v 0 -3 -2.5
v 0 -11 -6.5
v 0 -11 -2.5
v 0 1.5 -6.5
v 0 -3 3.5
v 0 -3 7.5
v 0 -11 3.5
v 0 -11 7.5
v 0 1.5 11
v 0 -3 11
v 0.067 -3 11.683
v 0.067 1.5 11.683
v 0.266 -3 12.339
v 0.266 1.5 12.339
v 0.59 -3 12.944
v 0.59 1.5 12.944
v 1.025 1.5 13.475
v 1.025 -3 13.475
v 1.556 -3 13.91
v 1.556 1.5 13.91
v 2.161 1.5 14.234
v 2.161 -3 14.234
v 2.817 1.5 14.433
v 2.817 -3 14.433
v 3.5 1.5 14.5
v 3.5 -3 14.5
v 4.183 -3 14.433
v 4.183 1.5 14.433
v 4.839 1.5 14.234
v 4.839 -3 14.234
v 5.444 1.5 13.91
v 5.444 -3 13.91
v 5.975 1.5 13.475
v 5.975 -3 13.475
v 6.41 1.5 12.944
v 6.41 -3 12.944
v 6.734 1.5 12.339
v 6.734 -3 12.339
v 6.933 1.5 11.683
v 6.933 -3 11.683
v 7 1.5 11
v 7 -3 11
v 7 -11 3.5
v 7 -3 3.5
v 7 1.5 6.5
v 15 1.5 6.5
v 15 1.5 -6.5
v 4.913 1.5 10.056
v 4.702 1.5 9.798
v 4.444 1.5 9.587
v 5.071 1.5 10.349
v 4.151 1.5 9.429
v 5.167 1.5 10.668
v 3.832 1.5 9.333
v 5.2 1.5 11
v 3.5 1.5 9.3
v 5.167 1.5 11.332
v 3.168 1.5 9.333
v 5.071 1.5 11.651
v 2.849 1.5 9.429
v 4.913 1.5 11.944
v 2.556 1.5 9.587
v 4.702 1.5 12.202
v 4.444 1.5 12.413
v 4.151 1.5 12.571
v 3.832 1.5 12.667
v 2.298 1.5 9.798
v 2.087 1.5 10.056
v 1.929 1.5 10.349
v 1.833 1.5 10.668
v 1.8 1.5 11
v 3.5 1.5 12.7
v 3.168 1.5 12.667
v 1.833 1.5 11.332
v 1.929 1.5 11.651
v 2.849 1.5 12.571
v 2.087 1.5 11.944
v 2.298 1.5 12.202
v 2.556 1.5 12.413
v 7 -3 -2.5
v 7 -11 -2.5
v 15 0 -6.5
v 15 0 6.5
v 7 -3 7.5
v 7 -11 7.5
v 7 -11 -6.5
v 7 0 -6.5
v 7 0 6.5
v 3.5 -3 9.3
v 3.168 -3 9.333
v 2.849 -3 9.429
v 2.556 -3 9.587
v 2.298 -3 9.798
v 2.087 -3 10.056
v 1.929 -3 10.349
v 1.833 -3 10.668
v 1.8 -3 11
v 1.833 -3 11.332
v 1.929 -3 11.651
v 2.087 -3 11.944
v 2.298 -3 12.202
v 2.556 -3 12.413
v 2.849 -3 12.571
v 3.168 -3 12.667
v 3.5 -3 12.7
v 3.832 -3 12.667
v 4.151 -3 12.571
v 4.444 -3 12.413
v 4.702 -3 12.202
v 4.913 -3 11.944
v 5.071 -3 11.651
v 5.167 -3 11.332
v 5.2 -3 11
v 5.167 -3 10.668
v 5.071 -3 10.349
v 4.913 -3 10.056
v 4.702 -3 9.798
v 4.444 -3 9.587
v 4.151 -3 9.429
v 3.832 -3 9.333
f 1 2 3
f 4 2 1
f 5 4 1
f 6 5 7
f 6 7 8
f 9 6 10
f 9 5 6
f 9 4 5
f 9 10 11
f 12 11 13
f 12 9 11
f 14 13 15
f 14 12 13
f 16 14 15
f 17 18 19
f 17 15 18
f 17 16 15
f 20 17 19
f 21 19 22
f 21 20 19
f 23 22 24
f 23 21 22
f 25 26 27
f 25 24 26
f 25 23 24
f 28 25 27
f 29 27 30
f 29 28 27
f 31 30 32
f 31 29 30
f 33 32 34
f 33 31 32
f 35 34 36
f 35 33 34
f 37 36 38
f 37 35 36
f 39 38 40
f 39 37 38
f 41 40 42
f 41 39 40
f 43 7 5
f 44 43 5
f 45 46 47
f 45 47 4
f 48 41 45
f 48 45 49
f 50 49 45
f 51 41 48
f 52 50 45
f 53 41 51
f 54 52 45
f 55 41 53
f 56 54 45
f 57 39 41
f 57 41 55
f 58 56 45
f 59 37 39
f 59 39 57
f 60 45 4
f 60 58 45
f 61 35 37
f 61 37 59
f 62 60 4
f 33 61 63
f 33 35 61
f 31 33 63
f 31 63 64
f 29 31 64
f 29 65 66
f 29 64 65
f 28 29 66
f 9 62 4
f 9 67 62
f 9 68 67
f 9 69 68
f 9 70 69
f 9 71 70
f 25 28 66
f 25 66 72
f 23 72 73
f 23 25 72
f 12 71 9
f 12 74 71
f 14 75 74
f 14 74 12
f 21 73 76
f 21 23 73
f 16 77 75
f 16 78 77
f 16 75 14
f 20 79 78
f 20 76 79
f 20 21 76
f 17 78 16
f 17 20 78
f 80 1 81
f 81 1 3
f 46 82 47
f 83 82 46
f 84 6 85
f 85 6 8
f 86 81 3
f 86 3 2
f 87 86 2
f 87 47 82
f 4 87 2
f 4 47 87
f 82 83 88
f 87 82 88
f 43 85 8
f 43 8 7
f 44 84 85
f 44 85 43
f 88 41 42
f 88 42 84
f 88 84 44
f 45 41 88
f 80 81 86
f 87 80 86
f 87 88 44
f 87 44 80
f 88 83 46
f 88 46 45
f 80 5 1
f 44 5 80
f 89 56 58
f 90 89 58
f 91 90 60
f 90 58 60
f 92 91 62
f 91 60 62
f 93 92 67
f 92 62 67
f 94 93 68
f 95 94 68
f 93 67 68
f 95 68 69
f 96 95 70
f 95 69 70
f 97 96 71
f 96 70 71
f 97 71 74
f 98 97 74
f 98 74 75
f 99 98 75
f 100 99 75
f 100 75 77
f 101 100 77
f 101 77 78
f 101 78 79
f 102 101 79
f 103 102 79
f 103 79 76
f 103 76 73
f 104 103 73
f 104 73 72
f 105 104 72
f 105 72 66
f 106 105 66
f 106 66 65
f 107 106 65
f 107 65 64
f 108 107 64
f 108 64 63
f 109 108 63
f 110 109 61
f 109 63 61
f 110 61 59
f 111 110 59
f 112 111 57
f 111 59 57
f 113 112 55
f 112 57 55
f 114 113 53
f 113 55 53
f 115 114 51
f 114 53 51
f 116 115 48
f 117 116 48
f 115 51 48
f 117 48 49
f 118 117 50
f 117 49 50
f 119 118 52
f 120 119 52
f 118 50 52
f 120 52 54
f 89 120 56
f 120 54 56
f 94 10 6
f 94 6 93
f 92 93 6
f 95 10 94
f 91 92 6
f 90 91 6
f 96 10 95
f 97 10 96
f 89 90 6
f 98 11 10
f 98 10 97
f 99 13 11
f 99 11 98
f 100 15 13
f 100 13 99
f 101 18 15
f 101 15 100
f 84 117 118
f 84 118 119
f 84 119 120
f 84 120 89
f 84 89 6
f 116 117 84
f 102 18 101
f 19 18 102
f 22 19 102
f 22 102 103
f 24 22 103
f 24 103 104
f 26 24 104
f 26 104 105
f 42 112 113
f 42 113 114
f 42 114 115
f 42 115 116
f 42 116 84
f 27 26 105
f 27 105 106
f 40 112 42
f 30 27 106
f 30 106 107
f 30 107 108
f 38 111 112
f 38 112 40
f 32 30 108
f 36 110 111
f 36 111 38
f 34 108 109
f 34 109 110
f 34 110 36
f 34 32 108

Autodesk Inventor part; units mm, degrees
ref_plane "YZ Plane" through (0, 0, 0) normal (1, 0, 0) x (0, 1, 0)
ref_plane "XZ Plane" through (0, 0, 0) normal (0, 1, 0) x (-1, 0, 0)
ref_plane "XY Plane" through (0, 0, 0) normal (0, 0, 1) x (1, 0, 0)
sketch "Sketch1" plane through (0, 0, 0) normal (0, 1, 0) x (-1, 0, 0)
  line L0 (0, -6.5) -> (-15, -6.5)
  line L1 (-15, -6.5) -> (-15, 6.5)
  line L2 (-15, 6.5) -> (0, 6.5)
  line L3 (0, 6.5) -> (0, -6.5)
  line L4 (0, -6.5) -> (-15, 6.5) construction
  line L5 (-15, -6.5) -> (0, 6.5) construction
  line L6 (0, -20.3) -> (0, 20.3) projected
  line L7 (-3.5, -11) -> (-3.5, 11) construction
  line L8 (0, -11) -> (0, -6.5) construction
  line L9 (-7, 11) -> (-7, -6.5)
  arc A0 (-7, -11) -> (0, -11) centre (-3.5, -11) ccw construction
  arc A1 (0, 11) -> (-7, 11) centre (-3.5, 11) ccw
  line L10 (0, -6.5) -> (0, 11)
  line L11 (-7, -6.5) -> (-7, -11) construction
  point P0 (0, 0)
  point P1 (-7.5, 0)
  point P2 (-7.5, 0)
  point P3 (-3.5, 0)
  point P4 (0, 11)
  point P5 (-7, 6.5)
  point P6 (0, 6.5)
  dimension "d0" = 13
  dimension "d1" = 15
  dimension "d3" = 7
  dimension "d4" = 8
  dimension "d5" = 8
extrude "Extrusion1" add sketch "Sketch1" along normal blind 1.5
sketch "Sketch2" plane through (0, 0, 0) normal (0, -1, 0) x (1, 0, 0)
  line L0 (7, 11) -> (7, 6.5) projected
  arc A0 (7, 11) -> (0, 11) centre (3.5, 11) ccw projected
  line L1 (0, -6.5) -> (0, 11) projected
  line L2 (15, -6.5) -> (0, -6.5) projected
  line L3 (15, 6.5) -> (15, -6.5) projected
  line L4 (7, 6.5) -> (15, 6.5) projected
  line L5 (7, 11) -> (7, 6.5) projected
  line L6 (7, 6.5) -> (7, -6.5)
  point P0 (0, 0)
extrude "Extrusion2" add sketch "Sketch2" along normal blind 3 contours L0 L6 L2 L1 A0
sketch "Sketch3" plane through (0, 1.5, -6.5) normal (-1, 0, 0) x (0, 0, 1)
  line L0 (14, -12.5) -> (10, -12.5)
  line L1 (10, -12.5) -> (10, -4.5)
  line L2 (10, -4.5) -> (14, -4.5)
  line L3 (14, -4.5) -> (14, -12.5)
  line L4 (17.5, -4.5) -> (0, -4.5) projected
  line L5 (13, -1.5) -> (13, 0) projected
  line L6 (0, -4.5) -> (4, -4.5)
  line L7 (4, -4.5) -> (4, -12.5)
  line L8 (4, -12.5) -> (0, -12.5)
  line L9 (0, -12.5) -> (0, -4.5)
  point P0 (6.5, -1.5)
  dimension "d10" = 4
  dimension "d11" = 8
  dimension "d12" = 1
  dimension "d13" = 4
extrude "Extrusion3" add sketch "Sketch3" against normal up to surface (7 mm away)
sketch "Sketch4" plane through (0, -3, 0) normal (0, -1, 0) x (1, 0, 0)
  arc A0 (7, 11) -> (0, 11) centre (3.5, 11) ccw projected
  point P0 (0, 0)
hole "Hole1" at (3.5, -3, 11) direction (0, 1, 0) diameter 3.4 end through all
equation "\"d5\" = d4"
equation "\"d13\" = d10"
properties part number "optical sensor"
